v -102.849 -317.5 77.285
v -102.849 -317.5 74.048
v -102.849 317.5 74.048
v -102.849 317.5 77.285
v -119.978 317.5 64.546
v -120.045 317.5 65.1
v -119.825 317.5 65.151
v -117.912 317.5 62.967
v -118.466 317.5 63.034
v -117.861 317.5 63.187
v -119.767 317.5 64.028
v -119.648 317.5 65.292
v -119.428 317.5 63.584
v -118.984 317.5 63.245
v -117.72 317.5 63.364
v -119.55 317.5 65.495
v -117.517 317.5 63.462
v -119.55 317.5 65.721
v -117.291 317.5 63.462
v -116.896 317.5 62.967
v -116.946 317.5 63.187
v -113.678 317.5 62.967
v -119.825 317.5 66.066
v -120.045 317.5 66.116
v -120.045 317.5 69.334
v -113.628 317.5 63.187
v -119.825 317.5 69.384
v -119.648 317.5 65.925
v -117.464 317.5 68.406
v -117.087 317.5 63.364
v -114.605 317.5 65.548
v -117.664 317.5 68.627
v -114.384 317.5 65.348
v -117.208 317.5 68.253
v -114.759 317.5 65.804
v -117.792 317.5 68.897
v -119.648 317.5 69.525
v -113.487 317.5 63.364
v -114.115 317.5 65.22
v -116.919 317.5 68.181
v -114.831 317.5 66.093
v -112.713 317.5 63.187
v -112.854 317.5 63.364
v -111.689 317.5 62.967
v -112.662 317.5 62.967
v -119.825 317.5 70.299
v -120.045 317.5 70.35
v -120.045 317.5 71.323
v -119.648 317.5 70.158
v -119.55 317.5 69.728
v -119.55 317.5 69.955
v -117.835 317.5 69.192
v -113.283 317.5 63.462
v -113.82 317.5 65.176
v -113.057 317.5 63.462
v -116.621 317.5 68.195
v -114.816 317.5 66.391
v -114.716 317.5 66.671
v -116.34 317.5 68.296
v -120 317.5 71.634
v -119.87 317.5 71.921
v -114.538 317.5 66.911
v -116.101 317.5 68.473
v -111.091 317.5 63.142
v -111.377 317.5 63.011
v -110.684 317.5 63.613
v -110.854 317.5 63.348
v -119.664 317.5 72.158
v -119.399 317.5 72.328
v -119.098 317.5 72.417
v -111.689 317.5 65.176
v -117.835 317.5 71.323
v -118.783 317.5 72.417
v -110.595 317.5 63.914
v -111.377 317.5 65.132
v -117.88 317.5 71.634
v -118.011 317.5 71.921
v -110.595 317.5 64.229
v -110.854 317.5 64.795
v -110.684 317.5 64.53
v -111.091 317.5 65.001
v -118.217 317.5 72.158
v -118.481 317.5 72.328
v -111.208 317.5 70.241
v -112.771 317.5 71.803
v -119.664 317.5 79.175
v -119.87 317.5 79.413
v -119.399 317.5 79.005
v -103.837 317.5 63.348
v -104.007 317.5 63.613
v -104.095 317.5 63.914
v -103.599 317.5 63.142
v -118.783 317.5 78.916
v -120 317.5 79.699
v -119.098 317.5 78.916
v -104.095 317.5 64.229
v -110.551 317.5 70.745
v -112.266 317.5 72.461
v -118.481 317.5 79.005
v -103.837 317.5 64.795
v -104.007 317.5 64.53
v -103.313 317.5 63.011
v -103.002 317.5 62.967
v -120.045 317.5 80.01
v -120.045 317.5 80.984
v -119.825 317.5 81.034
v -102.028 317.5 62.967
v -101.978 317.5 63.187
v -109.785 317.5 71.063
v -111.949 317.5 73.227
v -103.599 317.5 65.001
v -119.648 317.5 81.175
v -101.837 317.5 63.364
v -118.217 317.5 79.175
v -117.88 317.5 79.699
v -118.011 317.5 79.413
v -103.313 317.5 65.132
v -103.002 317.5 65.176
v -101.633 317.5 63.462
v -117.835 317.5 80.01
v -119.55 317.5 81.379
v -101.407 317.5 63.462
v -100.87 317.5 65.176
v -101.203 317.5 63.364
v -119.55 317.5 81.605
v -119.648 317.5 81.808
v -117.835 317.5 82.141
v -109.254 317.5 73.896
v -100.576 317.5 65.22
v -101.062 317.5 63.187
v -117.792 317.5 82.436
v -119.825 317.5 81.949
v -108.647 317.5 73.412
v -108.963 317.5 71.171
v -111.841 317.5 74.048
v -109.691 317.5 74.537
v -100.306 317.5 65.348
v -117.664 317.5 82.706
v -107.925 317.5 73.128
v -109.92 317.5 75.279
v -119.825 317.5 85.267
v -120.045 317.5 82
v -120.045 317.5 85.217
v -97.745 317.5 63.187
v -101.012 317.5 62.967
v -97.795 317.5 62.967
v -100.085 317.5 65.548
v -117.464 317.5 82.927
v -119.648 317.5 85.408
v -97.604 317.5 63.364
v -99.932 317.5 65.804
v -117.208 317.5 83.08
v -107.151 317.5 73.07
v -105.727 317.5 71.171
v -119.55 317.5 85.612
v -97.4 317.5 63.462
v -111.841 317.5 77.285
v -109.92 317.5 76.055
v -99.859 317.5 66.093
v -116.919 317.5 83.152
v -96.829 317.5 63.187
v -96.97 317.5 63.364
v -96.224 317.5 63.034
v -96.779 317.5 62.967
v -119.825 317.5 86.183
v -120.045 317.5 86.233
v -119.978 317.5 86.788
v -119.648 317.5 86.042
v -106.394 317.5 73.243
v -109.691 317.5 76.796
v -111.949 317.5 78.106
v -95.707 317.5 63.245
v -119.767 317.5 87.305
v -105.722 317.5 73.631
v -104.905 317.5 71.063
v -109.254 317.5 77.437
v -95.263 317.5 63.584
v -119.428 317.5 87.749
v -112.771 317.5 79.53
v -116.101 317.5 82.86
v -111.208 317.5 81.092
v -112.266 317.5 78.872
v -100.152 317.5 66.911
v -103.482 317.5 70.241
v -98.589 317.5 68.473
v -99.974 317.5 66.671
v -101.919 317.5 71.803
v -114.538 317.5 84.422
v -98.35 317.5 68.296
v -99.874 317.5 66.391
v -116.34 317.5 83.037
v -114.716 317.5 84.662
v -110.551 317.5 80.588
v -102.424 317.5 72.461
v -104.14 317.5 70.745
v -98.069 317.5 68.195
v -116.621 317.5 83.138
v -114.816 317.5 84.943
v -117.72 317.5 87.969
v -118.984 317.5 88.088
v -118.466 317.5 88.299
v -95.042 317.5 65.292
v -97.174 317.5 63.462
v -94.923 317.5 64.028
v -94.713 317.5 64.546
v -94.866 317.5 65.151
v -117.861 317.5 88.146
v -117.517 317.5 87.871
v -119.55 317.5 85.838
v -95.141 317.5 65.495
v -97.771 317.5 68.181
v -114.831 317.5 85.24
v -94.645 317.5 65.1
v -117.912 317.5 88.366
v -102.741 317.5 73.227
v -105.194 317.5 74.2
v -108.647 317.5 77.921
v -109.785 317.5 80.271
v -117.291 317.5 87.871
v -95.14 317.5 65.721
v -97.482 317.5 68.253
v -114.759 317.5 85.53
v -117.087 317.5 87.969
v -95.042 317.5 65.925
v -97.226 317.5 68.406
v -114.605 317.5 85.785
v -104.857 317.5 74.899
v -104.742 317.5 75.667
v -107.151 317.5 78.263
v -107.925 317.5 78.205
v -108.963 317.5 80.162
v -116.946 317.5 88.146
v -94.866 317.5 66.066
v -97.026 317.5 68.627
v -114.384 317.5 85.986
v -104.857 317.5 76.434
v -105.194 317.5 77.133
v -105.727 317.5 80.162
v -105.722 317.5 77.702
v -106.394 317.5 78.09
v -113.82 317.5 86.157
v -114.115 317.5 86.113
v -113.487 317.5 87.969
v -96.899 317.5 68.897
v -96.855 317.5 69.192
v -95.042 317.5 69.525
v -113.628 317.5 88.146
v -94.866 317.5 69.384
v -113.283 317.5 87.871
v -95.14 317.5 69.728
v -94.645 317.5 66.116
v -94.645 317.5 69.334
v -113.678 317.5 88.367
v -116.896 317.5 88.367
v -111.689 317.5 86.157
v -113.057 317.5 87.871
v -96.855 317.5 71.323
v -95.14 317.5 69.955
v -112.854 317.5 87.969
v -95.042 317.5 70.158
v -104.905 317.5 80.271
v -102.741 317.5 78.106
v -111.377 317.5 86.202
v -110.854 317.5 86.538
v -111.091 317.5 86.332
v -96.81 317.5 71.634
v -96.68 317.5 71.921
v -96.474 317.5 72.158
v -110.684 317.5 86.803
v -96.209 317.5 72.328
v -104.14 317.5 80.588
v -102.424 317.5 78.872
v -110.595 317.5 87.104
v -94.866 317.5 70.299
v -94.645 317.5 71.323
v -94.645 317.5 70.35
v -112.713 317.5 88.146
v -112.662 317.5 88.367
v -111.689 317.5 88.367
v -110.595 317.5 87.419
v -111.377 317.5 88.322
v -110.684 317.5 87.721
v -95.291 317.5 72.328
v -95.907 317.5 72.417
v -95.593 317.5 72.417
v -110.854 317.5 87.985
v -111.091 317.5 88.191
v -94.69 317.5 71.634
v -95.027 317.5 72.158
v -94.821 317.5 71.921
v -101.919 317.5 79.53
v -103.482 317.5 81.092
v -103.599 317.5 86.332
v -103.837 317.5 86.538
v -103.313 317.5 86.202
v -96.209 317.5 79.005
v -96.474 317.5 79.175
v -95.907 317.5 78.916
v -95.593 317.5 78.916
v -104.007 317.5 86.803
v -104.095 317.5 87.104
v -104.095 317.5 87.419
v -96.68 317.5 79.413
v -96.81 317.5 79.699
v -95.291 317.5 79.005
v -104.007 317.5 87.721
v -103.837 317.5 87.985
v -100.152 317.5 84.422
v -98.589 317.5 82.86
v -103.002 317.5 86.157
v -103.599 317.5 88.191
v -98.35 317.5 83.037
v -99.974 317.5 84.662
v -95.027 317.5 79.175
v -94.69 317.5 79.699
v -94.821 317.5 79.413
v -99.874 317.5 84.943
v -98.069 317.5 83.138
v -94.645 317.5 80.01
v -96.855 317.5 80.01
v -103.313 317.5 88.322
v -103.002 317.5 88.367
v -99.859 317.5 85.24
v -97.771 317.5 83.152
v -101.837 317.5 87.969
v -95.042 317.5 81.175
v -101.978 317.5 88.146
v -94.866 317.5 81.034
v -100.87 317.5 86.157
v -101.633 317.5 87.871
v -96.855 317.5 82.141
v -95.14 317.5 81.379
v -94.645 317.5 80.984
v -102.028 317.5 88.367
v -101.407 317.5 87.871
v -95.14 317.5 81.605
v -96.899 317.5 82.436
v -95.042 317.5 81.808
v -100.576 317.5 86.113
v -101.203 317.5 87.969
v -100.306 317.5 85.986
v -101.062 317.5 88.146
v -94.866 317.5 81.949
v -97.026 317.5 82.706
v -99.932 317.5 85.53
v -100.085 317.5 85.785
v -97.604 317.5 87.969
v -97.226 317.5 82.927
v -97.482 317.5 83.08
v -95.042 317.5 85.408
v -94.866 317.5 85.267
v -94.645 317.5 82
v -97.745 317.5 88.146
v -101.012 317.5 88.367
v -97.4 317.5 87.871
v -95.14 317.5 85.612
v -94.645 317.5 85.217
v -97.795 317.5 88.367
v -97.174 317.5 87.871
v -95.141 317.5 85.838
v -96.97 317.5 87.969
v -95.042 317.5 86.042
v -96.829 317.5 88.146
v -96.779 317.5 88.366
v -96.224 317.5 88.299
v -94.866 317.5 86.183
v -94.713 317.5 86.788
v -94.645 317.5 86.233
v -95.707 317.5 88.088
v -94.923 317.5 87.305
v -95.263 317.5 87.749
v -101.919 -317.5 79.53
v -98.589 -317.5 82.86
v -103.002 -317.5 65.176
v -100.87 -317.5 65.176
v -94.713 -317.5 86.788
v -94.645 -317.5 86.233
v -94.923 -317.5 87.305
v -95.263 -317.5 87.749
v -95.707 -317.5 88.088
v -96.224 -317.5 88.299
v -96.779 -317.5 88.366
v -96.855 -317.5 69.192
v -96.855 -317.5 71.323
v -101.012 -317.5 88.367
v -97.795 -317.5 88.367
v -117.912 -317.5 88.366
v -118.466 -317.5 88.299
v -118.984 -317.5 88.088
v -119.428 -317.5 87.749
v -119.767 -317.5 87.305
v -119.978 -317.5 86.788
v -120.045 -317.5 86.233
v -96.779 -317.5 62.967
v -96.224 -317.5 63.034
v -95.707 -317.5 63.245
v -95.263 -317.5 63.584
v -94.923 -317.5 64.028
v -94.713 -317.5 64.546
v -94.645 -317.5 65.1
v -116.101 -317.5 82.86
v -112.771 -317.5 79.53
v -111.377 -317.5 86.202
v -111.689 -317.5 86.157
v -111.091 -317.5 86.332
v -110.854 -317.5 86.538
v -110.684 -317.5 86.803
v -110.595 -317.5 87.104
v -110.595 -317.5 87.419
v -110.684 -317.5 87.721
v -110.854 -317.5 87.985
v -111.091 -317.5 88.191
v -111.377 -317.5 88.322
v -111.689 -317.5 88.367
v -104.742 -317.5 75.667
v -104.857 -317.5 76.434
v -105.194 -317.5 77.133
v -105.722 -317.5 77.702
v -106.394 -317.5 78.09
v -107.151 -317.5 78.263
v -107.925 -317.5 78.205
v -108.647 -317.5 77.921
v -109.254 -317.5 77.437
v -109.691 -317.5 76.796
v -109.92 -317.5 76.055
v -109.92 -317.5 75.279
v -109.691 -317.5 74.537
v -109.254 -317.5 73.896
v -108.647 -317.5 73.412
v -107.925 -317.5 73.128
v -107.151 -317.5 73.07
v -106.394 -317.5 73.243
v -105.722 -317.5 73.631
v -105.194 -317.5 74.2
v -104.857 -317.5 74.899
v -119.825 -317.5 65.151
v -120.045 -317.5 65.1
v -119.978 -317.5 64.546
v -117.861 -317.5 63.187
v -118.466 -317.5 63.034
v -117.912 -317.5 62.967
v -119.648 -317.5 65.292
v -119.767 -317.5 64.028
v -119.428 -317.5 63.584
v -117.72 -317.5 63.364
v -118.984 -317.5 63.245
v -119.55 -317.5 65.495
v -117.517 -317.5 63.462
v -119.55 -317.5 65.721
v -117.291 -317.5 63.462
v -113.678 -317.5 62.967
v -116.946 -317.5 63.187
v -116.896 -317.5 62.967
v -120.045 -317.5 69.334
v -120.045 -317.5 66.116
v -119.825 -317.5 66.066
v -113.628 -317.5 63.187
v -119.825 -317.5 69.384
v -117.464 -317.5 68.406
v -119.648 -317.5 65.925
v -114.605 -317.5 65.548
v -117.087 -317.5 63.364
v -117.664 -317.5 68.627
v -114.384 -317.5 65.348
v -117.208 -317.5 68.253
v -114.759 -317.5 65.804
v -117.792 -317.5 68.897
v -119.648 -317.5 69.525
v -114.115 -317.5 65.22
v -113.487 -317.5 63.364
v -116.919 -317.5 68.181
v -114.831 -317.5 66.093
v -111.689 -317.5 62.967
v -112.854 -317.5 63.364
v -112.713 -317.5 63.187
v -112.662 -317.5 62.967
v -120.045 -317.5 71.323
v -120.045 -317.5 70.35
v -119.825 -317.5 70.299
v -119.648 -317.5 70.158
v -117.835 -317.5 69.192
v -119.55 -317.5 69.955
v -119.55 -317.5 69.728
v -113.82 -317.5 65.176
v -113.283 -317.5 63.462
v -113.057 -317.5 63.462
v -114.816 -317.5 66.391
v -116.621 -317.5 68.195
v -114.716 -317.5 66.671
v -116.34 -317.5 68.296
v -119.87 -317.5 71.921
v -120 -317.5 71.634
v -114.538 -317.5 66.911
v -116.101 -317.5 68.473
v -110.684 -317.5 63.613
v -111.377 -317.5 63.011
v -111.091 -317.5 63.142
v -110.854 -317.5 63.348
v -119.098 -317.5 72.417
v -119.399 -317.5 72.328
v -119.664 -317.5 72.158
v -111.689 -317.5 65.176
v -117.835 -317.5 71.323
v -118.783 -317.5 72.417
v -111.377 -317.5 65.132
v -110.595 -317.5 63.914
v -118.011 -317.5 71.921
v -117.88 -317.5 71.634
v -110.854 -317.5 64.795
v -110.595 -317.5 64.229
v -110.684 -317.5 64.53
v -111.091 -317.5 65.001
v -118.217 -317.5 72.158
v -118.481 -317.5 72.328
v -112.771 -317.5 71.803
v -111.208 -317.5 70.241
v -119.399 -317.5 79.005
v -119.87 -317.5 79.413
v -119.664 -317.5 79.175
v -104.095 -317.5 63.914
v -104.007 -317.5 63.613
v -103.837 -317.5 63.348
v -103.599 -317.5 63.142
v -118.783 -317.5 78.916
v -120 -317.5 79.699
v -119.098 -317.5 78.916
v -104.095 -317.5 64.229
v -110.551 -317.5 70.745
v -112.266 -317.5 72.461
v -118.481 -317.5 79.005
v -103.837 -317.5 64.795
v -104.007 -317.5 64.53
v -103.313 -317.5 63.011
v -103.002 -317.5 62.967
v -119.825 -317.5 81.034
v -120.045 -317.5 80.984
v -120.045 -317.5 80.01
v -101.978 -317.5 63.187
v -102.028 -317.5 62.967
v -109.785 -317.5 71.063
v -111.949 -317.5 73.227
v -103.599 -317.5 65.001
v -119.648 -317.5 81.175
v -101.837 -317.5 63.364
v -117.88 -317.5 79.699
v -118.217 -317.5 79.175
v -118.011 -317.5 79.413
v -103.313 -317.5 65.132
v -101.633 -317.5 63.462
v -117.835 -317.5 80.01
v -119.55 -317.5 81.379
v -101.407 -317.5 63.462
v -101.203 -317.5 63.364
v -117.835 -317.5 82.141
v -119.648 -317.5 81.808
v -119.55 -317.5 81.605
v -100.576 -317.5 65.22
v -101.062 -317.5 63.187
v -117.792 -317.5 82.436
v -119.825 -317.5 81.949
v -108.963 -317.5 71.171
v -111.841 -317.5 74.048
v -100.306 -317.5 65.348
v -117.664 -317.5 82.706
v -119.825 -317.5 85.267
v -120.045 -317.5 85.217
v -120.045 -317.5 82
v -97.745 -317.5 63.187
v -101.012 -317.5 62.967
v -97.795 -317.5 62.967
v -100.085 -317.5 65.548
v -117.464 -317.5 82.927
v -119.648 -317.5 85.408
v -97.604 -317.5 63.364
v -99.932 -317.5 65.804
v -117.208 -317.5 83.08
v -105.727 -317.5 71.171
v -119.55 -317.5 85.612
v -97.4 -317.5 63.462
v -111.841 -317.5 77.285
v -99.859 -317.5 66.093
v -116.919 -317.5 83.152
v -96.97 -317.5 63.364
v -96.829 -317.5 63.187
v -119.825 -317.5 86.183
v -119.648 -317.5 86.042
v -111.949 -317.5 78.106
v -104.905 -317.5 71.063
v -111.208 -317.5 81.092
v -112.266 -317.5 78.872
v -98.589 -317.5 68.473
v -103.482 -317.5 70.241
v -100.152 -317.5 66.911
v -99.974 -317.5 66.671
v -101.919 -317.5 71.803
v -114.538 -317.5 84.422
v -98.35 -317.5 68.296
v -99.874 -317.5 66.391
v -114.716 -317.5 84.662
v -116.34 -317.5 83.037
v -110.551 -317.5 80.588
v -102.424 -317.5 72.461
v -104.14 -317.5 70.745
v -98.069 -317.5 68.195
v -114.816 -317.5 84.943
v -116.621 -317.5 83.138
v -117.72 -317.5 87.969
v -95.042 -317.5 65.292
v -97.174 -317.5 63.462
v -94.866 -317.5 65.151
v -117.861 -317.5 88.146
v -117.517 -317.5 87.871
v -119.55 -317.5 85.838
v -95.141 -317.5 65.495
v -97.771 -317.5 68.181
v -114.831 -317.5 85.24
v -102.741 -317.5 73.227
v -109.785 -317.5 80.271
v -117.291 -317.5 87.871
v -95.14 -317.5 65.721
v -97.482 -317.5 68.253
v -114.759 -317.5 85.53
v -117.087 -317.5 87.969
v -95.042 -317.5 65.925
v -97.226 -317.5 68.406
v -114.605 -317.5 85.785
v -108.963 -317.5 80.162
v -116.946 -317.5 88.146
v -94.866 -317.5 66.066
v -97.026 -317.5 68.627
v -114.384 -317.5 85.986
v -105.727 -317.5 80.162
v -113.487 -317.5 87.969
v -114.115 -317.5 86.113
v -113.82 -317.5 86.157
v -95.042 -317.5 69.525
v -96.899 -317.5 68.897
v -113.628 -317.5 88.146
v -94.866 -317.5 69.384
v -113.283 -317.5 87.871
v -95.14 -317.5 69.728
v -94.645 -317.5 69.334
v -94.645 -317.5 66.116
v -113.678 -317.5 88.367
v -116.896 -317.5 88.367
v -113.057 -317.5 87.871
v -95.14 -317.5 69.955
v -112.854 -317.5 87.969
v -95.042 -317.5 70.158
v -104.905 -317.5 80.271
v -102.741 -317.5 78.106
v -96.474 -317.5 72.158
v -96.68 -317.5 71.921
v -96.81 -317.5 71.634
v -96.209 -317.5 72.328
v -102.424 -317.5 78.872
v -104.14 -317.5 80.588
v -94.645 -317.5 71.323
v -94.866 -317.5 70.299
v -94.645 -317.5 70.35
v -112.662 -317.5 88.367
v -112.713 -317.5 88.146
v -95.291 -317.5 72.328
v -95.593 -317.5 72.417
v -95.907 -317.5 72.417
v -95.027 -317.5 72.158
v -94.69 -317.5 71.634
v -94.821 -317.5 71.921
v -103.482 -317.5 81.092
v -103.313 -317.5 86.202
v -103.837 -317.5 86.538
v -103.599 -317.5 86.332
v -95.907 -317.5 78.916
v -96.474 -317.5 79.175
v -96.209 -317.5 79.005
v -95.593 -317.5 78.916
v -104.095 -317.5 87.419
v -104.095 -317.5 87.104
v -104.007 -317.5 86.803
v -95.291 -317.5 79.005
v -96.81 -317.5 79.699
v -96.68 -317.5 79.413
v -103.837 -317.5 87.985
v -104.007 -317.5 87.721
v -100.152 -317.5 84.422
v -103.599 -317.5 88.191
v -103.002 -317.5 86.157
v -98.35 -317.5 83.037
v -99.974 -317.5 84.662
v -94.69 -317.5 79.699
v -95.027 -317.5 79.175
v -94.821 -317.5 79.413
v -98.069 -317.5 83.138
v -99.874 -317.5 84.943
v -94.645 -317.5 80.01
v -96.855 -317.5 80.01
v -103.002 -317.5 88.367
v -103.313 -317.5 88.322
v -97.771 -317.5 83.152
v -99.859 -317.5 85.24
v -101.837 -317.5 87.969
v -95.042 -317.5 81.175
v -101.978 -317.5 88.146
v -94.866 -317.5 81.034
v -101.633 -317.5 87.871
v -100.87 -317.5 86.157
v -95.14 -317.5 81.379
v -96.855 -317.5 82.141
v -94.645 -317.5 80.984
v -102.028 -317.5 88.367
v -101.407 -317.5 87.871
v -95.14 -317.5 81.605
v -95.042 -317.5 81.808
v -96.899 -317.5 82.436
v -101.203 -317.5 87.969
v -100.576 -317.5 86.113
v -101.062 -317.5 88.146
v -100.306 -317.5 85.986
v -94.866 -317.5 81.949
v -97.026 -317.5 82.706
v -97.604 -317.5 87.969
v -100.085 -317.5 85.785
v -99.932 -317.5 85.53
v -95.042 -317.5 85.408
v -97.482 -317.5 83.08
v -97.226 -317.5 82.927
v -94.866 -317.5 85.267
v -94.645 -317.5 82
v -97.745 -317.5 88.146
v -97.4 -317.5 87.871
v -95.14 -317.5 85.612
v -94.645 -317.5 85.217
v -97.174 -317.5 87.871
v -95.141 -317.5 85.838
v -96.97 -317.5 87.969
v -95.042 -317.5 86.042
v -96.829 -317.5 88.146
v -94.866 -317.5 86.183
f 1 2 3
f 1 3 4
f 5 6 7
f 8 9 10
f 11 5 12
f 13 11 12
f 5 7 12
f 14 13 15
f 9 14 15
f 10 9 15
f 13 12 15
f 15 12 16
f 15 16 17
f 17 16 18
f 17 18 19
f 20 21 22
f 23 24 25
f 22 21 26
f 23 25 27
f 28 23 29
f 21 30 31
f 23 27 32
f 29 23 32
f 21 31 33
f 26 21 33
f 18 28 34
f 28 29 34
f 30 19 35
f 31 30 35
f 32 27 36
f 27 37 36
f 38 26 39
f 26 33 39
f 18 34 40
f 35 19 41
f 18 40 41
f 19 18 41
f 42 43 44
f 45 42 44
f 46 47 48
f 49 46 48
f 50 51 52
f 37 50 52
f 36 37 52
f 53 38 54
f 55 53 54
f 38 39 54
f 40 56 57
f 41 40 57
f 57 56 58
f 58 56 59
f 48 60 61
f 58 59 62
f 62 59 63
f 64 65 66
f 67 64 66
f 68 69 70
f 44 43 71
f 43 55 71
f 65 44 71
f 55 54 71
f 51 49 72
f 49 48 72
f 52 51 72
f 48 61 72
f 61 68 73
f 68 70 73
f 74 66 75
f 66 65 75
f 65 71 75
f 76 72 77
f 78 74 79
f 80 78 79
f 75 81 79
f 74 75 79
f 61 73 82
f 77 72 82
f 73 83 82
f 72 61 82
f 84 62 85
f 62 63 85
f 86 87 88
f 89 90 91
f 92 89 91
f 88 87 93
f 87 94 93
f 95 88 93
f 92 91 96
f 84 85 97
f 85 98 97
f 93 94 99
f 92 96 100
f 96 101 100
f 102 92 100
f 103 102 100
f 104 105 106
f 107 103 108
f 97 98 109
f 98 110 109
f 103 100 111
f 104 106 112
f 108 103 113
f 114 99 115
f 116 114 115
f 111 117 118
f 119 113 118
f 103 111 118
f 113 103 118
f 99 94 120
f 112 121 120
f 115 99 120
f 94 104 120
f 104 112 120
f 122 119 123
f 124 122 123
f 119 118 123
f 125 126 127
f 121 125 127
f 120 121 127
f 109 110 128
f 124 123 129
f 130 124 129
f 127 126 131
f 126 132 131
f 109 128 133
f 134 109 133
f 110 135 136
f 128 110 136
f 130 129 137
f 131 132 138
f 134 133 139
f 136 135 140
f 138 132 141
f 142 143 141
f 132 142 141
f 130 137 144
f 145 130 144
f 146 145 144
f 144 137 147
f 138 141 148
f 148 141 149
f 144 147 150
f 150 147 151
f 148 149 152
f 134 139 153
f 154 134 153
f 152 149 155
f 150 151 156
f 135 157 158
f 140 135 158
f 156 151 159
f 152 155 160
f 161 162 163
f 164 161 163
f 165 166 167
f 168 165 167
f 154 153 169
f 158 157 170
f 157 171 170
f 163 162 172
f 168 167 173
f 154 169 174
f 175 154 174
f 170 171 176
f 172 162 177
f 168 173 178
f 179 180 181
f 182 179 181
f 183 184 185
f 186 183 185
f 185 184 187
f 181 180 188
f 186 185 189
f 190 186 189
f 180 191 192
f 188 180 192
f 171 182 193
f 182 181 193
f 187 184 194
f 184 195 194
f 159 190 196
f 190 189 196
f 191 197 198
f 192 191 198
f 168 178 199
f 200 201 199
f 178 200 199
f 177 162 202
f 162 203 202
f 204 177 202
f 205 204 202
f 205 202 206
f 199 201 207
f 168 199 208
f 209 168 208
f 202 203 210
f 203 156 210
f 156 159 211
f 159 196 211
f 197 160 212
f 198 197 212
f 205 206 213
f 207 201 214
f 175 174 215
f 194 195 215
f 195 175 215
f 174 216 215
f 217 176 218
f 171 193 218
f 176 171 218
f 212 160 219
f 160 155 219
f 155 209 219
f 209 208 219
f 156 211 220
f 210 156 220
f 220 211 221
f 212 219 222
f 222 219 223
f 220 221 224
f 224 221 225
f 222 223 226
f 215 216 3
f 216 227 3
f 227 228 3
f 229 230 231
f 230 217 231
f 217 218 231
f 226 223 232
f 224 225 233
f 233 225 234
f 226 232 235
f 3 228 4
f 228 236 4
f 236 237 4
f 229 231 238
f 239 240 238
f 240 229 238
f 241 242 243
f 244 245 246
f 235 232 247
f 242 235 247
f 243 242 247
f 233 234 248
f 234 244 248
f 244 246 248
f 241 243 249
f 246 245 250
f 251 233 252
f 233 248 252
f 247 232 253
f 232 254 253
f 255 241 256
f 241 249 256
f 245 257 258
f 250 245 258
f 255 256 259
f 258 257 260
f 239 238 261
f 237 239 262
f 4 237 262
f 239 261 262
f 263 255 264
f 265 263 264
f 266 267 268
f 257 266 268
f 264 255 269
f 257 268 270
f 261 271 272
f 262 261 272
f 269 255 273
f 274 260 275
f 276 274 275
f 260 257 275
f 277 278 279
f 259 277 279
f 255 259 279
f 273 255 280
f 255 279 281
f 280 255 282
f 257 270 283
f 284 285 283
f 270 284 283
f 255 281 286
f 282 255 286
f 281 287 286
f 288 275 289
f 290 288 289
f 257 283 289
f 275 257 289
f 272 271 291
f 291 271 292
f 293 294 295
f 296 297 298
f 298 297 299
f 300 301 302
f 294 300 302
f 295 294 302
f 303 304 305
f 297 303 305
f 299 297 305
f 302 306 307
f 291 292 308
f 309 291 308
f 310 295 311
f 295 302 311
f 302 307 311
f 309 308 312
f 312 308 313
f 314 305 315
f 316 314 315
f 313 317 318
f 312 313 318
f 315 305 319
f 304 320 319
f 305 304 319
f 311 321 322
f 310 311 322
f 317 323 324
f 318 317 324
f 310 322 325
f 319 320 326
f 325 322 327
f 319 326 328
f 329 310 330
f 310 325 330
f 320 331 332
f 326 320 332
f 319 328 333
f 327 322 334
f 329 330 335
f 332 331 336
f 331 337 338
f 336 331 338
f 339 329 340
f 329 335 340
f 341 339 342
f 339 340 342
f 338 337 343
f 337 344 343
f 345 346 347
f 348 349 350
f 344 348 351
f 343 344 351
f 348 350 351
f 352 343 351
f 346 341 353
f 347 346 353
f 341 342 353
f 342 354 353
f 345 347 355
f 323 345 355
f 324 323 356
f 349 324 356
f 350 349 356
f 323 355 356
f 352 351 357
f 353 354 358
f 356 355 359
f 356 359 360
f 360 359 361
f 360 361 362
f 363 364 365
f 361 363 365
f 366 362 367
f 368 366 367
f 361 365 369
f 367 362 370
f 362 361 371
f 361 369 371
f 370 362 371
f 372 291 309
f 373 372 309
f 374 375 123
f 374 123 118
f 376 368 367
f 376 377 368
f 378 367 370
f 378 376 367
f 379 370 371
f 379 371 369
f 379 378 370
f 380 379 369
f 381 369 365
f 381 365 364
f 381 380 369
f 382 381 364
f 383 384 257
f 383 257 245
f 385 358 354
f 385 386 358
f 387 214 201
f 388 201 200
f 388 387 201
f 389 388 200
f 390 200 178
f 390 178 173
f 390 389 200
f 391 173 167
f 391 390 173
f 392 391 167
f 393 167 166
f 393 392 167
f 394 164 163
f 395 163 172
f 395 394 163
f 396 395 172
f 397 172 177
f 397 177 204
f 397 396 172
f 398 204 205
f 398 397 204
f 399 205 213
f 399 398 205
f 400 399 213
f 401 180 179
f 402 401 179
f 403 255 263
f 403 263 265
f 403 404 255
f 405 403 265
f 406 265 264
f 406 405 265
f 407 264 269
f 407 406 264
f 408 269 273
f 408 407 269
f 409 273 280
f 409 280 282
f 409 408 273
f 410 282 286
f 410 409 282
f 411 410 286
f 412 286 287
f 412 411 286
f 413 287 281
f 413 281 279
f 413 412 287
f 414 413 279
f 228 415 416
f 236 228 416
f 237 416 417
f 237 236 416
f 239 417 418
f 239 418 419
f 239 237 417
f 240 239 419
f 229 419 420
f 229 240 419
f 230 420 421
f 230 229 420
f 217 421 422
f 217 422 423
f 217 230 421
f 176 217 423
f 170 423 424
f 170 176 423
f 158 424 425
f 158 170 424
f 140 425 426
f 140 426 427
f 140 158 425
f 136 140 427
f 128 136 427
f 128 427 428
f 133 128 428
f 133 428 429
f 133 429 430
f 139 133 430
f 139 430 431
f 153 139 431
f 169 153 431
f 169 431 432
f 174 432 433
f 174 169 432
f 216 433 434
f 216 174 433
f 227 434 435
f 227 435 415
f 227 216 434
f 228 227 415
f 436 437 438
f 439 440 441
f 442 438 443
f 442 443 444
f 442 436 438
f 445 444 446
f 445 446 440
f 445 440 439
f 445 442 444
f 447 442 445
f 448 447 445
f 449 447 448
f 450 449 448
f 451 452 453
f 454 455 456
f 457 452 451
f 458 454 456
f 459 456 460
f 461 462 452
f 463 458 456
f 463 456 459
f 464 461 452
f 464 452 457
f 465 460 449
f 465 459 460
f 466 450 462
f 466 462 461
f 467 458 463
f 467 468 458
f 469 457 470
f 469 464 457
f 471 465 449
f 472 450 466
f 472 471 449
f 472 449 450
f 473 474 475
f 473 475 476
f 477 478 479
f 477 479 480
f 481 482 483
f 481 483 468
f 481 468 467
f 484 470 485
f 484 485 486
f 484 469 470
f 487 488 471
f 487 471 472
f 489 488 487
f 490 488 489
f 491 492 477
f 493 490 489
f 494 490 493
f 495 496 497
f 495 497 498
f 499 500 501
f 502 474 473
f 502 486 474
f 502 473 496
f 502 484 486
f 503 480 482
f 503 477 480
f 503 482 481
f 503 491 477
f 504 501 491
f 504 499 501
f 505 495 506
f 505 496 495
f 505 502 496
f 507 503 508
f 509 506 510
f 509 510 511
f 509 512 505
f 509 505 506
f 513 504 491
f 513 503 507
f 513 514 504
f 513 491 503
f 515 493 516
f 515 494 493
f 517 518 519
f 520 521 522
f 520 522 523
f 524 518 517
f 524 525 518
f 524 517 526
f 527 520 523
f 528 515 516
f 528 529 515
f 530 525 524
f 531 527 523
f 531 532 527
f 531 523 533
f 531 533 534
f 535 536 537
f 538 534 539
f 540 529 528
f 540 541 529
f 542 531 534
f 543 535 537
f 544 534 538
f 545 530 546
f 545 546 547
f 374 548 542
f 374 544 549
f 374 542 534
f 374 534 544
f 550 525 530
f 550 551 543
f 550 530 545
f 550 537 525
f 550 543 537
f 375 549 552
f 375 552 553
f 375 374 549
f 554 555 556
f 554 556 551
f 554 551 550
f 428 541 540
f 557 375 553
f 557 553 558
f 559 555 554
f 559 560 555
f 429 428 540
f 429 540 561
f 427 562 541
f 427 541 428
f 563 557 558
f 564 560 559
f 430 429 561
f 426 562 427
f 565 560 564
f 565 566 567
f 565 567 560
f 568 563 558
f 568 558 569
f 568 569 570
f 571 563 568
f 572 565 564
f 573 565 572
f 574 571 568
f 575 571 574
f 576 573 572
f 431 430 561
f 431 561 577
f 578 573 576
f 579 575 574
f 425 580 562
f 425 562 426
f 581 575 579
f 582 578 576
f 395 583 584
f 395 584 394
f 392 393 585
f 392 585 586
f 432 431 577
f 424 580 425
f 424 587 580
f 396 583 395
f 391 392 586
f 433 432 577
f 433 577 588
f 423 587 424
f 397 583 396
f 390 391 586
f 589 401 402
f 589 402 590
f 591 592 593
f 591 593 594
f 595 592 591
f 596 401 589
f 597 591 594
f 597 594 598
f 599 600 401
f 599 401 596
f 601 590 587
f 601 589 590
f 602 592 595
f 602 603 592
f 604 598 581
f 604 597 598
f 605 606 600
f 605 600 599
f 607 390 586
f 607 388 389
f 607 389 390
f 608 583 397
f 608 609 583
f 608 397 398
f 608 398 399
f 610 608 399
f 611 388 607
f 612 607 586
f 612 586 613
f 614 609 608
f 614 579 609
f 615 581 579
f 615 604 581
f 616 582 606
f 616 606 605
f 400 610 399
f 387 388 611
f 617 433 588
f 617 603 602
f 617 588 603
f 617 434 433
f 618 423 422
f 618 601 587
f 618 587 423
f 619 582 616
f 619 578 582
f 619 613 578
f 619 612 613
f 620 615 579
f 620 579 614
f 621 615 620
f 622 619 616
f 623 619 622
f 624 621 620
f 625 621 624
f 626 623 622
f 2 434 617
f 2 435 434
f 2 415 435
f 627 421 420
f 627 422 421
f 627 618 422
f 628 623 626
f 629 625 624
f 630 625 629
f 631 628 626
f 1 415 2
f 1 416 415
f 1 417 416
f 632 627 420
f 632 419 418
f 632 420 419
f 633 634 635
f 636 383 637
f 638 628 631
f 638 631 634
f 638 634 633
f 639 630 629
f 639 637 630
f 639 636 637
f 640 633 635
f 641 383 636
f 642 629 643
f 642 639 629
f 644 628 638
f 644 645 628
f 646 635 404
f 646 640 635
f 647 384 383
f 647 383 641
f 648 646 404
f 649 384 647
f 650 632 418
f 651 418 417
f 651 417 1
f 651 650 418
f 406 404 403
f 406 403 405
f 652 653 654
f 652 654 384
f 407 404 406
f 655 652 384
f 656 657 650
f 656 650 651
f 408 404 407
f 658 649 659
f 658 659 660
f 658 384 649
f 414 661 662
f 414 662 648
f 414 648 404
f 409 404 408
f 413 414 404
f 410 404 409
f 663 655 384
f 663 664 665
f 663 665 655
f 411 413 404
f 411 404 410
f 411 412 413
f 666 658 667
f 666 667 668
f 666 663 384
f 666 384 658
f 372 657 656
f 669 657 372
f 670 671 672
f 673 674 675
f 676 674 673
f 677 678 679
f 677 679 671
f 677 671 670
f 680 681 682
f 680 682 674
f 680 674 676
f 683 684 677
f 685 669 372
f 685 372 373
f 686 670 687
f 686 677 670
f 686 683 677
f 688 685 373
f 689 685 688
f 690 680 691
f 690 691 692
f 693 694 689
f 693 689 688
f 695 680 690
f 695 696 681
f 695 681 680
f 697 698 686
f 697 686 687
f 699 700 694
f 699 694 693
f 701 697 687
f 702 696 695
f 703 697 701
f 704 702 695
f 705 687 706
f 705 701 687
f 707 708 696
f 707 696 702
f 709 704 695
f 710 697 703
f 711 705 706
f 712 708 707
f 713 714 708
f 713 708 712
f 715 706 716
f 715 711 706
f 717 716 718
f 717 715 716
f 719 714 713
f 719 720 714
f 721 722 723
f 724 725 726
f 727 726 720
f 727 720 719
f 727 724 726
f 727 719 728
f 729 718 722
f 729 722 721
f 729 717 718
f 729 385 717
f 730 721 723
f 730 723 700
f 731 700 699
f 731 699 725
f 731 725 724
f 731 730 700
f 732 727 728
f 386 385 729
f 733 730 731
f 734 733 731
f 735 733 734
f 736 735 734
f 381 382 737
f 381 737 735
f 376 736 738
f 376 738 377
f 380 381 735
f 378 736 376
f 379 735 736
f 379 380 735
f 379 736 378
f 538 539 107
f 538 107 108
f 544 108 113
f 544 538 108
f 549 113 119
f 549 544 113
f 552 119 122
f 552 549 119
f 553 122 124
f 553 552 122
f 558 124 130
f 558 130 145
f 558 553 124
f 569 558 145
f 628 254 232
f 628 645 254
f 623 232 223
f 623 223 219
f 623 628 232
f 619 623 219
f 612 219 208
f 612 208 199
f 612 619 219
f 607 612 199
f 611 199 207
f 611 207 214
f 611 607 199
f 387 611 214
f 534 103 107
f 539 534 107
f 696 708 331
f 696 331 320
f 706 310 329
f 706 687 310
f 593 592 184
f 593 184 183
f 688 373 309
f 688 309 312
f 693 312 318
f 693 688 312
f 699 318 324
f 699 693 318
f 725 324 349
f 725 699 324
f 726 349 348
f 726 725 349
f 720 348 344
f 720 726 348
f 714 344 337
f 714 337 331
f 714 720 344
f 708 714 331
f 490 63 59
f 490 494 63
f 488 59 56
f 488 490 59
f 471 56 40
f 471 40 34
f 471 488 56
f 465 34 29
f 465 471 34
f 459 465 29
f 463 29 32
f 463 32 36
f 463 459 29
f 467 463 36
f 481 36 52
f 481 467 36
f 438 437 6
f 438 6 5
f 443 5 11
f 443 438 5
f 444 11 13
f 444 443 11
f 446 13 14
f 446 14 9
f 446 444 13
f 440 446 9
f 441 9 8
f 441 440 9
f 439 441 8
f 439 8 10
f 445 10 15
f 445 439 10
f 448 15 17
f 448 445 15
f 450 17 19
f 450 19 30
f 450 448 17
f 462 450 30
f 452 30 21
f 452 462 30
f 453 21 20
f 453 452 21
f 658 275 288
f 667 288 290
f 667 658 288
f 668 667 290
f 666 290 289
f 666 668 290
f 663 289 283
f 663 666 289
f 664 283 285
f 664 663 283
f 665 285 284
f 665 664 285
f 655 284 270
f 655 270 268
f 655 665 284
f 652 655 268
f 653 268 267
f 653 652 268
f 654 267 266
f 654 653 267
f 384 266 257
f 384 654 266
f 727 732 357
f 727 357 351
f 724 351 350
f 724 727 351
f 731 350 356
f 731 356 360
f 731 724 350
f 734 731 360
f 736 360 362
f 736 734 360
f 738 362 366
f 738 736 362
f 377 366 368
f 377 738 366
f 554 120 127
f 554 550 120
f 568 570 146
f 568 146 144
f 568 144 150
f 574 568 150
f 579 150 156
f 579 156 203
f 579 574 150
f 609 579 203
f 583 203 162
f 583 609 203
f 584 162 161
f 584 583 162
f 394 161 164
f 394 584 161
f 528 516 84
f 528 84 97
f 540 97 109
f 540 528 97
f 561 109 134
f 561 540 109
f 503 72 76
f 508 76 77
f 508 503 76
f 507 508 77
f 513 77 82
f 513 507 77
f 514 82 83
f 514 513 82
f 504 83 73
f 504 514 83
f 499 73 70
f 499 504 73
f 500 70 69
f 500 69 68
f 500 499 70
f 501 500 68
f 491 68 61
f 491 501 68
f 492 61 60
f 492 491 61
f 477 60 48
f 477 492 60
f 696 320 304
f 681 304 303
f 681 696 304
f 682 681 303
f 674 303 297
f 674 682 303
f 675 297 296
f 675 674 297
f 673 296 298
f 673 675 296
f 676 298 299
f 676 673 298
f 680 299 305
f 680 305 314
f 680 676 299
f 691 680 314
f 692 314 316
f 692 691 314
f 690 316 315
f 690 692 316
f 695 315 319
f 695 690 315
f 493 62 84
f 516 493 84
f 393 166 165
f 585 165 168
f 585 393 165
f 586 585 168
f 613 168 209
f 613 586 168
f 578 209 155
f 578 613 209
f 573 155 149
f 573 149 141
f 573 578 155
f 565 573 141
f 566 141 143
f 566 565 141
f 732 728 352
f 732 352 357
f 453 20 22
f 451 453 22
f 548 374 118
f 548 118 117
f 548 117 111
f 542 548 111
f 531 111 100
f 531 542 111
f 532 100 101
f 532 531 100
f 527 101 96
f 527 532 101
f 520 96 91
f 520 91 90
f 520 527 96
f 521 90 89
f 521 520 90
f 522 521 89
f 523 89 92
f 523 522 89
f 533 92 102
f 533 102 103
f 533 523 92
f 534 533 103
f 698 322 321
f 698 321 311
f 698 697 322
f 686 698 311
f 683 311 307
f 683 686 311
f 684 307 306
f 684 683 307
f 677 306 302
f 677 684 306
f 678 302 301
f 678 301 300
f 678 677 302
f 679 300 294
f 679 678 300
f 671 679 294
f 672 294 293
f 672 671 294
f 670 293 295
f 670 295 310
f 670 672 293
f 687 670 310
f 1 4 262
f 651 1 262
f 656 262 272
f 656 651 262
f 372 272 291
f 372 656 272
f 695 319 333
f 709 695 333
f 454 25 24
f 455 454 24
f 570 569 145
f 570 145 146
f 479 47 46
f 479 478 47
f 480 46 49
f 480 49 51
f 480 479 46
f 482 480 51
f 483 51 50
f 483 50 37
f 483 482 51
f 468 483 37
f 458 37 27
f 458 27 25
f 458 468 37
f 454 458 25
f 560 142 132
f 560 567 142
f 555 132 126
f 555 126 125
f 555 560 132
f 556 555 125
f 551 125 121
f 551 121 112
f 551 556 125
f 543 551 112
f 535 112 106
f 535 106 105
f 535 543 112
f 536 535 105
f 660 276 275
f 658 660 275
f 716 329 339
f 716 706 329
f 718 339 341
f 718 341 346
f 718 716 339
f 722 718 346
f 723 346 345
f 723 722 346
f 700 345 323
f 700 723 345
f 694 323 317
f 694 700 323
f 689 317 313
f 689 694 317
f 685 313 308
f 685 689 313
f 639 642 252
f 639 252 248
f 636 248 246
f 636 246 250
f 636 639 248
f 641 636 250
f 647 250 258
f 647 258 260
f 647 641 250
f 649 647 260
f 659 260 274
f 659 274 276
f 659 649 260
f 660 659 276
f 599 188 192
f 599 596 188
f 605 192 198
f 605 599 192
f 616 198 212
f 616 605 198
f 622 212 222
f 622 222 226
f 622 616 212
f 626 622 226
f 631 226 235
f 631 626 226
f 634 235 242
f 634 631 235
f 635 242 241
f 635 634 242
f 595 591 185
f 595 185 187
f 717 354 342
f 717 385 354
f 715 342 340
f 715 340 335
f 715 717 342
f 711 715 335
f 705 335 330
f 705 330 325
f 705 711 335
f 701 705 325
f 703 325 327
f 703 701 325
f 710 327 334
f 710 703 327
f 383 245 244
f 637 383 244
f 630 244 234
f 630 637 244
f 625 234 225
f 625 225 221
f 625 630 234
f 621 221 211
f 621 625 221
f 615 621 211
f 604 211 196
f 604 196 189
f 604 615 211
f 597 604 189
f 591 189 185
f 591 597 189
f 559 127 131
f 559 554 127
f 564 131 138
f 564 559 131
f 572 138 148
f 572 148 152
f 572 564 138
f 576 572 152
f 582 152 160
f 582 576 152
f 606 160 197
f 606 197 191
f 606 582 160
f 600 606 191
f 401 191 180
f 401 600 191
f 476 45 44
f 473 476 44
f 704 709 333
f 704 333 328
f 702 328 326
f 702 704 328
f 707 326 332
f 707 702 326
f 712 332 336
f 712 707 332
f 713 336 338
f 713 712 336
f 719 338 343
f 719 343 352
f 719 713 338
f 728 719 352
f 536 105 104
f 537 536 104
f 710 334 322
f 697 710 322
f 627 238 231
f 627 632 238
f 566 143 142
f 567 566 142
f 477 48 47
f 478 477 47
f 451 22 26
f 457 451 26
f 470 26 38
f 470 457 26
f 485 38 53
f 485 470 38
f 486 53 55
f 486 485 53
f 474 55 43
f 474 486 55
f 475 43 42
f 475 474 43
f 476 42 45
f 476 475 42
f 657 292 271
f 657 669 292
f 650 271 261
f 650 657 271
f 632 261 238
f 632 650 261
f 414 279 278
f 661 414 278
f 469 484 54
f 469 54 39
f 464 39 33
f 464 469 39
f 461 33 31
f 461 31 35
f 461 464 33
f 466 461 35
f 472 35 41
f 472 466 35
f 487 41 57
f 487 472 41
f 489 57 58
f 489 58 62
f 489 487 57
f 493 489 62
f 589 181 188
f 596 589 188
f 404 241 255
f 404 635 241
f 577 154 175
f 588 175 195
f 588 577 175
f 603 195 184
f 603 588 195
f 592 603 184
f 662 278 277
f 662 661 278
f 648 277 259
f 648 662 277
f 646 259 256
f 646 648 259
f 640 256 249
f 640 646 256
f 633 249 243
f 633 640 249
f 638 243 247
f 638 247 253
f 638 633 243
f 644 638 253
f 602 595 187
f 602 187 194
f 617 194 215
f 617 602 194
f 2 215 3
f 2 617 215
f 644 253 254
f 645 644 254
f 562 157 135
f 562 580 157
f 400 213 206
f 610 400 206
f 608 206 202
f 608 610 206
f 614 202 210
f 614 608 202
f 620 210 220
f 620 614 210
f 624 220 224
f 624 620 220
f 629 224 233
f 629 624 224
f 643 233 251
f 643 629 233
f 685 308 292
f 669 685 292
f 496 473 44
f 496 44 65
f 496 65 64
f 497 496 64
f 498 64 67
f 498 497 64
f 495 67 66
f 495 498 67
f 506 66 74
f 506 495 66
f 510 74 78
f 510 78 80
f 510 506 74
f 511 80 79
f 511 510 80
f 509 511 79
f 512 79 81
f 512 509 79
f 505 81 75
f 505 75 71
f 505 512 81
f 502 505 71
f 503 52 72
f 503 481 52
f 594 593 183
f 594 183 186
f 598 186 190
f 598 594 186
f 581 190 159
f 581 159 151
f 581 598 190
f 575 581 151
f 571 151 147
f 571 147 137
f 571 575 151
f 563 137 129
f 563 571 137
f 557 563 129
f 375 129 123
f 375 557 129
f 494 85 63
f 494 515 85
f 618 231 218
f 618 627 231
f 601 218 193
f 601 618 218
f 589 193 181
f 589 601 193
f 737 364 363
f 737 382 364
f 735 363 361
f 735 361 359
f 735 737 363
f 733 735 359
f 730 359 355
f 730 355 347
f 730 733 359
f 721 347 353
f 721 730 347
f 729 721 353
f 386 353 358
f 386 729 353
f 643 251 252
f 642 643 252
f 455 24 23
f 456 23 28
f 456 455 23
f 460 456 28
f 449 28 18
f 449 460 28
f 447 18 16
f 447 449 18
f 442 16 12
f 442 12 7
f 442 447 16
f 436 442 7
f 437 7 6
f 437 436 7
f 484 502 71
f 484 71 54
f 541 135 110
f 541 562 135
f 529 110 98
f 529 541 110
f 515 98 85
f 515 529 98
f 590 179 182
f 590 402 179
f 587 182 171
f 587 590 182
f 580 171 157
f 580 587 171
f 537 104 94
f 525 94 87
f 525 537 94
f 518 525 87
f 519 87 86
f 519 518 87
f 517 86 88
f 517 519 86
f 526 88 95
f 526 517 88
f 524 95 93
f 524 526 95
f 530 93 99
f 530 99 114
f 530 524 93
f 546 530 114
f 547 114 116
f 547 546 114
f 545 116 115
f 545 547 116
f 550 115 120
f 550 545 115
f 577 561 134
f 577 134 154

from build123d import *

# Parameters (mm, degrees)
F0_R     = 2.6035
F1_DEPTH = 317.5


# Not quite as in the source:
# - ends of sketch curves that miss each other by under 0.0002 mm in the source are joined


with BuildPart() as f1:
    # F0 (on Front) → F1 (new body, symmetric)
    with BuildSketch(Plane.XZ):
        with BuildLine():
            ThreePointArc((-120.045226, 66.1162), (-119.5372260057, 65.6082762), (-120.0450736, 65.1002000229))
            ThreePointArc((-120.0450736, 65.1002000229), (-119.4277485161, 63.5840774839), (-117.9116260074, 62.9667530175))
            ThreePointArc((-117.9116260074, 62.9667530175), (-117.4035498, 63.4745999943), (-116.895626, 62.9666))
            Line((-116.895626, 62.9666), (-113.6783096, 62.9666))
            ThreePointArc((-113.6783096, 62.9666), (-113.1703096, 63.4746), (-112.6623096, 62.9666))
            Line((-112.6623096, 62.9666), (-111.688626, 62.9666))
            ThreePointArc((-111.688626, 62.9666), (-110.583726, 64.0715), (-111.688626, 65.1764))
            Line((-111.688626, 65.1764), (-113.8200162, 65.1764))
            ThreePointArc((-113.8200162, 65.1764), (-114.758677805, 65.8035936327), (-114.5384366897, 66.9108204897))
            Line((-114.5384366897, 66.9108204897), (-111.2083882, 70.2408552))
            ThreePointArc((-111.2083882, 70.2408552), (-110.1783528978, 70.9291175157), (-108.963333, 71.1708))
            Line((-108.963333, 71.1708), (-105.727119, 71.1708))
            ThreePointArc((-105.727119, 71.1708), (-104.5120991022, 70.9291175157), (-103.4820549697, 70.2408640303))
            Line((-103.4820549697, 70.2408640303), (-100.1520222, 66.9108136))
            ThreePointArc((-100.1520222, 66.9108136), (-99.931774195, 65.8035936327), (-100.8704358, 65.1764))
            Line((-100.8704358, 65.1764), (-103.001826, 65.1764))
            ThreePointArc((-103.001826, 65.1764), (-104.106726, 64.0715), (-103.001826, 62.9666))
            Line((-103.001826, 62.9666), (-102.0281424, 62.9666))
            ThreePointArc((-102.0281424, 62.9666), (-101.5201424, 63.4746), (-101.0121424, 62.9666))
            Line((-101.0121424, 62.9666), (-97.794826, 62.9666))
            ThreePointArc((-97.794826, 62.9666), (-97.2869022, 63.4745999943), (-96.7788260229, 62.9667524))
            ThreePointArc((-96.7788260229, 62.9667524), (-95.2627034839, 63.5840774839), (-94.6453790175, 65.1001999926))
            ThreePointArc((-94.6453790175, 65.1001999926), (-95.1532259943, 65.6082762), (-94.645226, 66.1162))
            Line((-94.645226, 66.1162), (-94.645226, 69.3335164))
            ThreePointArc((-94.645226, 69.3335164), (-95.153226, 69.8415164), (-94.645226, 70.3495164))
            Line((-94.645226, 70.3495164), (-94.645226, 71.3232))
            ThreePointArc((-94.645226, 71.3232), (-95.750126, 72.4281), (-96.855026, 71.3232))
            Line((-96.855026, 71.3232), (-96.855026, 69.1918098))
            ThreePointArc((-96.855026, 69.1918098), (-97.4822196327, 68.253148195), (-98.5894464897, 68.4733893103))
            Line((-98.5894464897, 68.4733893103), (-101.9194812, 71.8034378))
            ThreePointArc((-101.9194812, 71.8034378), (-102.6077435157, 72.8334731022), (-102.849426, 74.048493))
            Line((-102.849426, 74.048493), (-102.849426, 77.284707))
            ThreePointArc((-102.849426, 77.284707), (-102.6077435157, 78.4997268978), (-101.9194900303, 79.5297710303))
            Line((-101.9194900303, 79.5297710303), (-98.5894396, 82.8598038))
            ThreePointArc((-98.5894396, 82.8598038), (-97.4822196327, 83.080051805), (-96.855026, 82.1413902))
            Line((-96.855026, 82.1413902), (-96.855026, 80.01))
            ThreePointArc((-96.855026, 80.01), (-95.750126, 78.9051), (-94.645226, 80.01))
            Line((-94.645226, 80.01), (-94.645226, 80.9836836))
            ThreePointArc((-94.645226, 80.9836836), (-95.153226, 81.4916836), (-94.645226, 81.9996836))
            Line((-94.645226, 81.9996836), (-94.645226, 85.217))
            ThreePointArc((-94.645226, 85.217), (-95.1532259943, 85.7249238), (-94.6453784, 86.2329999771))
            ThreePointArc((-94.6453784, 86.2329999771), (-95.2627034839, 87.7491225161), (-96.7788259926, 88.3664469825))
            ThreePointArc((-96.7788259926, 88.3664469825), (-97.2869022, 87.8586000057), (-97.794826, 88.3666))
            Line((-97.794826, 88.3666), (-101.0121424, 88.3666))
            ThreePointArc((-101.0121424, 88.3666), (-101.5201424, 87.8586), (-102.0281424, 88.3666))
            Line((-102.0281424, 88.3666), (-103.001826, 88.3666))
            ThreePointArc((-103.001826, 88.3666), (-104.106726, 87.2617), (-103.001826, 86.1568))
            Line((-103.001826, 86.1568), (-100.8704358, 86.1568))
            ThreePointArc((-100.8704358, 86.1568), (-99.931774195, 85.5296063673), (-100.1520153103, 84.4223795103))
            Line((-100.1520153103, 84.4223795103), (-103.4820638, 81.0923448))
            ThreePointArc((-103.4820638, 81.0923448), (-104.5120991022, 80.4040824843), (-105.727119, 80.1624))
            Line((-105.727119, 80.1624), (-108.963333, 80.1624))
            ThreePointArc((-108.963333, 80.1624), (-110.1783528978, 80.4040824843), (-111.2083970303, 81.0923359697))
            Line((-111.2083970303, 81.0923359697), (-114.5384298, 84.4223864))
            ThreePointArc((-114.5384298, 84.4223864), (-114.758677805, 85.5296063673), (-113.8200162, 86.1568))
            Line((-113.8200162, 86.1568), (-111.688626, 86.1568))
            ThreePointArc((-111.688626, 86.1568), (-110.583726, 87.2617), (-111.688626, 88.3666))
            Line((-111.688626, 88.3666), (-112.6623096, 88.3666))
            ThreePointArc((-112.6623096, 88.3666), (-113.1703096, 87.8586), (-113.6783096, 88.3666))
            Line((-113.6783096, 88.3666), (-116.895626, 88.3666))
            ThreePointArc((-116.895626, 88.3666), (-117.4035498, 87.8586000057), (-117.9116259771, 88.3664476))
            ThreePointArc((-117.9116259771, 88.3664476), (-119.4277485161, 87.7491225161), (-120.0450729825, 86.2330000074))
            ThreePointArc((-120.0450729825, 86.2330000074), (-119.5372260057, 85.7249238), (-120.045226, 85.217))
            Line((-120.045226, 85.217), (-120.045226, 81.9996836))
            ThreePointArc((-120.045226, 81.9996836), (-119.537226, 81.4916836), (-120.045226, 80.9836836))
            Line((-120.045226, 80.9836836), (-120.045226, 80.01))
            ThreePointArc((-120.045226, 80.01), (-118.940326, 78.9051), (-117.835426, 80.01))
            Line((-117.835426, 80.01), (-117.835426, 82.1413902))
            ThreePointArc((-117.835426, 82.1413902), (-117.2082323673, 83.080051805), (-116.1010055103, 82.8598106897))
            Line((-116.1010055103, 82.8598106897), (-112.7709708, 79.5297622))
            ThreePointArc((-112.7709708, 79.5297622), (-112.0827084843, 78.4997268978), (-111.841026, 77.284707))
            Line((-111.841026, 77.284707), (-111.841026, 74.048493))
            ThreePointArc((-111.841026, 74.048493), (-112.0827084843, 72.8334731022), (-112.7709619697, 71.8034289697))
            Line((-112.7709619697, 71.8034289697), (-116.1010124, 68.4733962))
            ThreePointArc((-116.1010124, 68.4733962), (-117.2082323673, 68.253148195), (-117.835426, 69.1918098))
            Line((-117.835426, 69.1918098), (-117.835426, 71.3232))
            ThreePointArc((-117.835426, 71.3232), (-118.940326, 72.4281), (-120.045226, 71.3232))
            Line((-120.045226, 71.3232), (-120.045226, 70.3495164))
            ThreePointArc((-120.045226, 70.3495164), (-119.537226, 69.8415164), (-120.045226, 69.3335164))
            Line((-120.045226, 69.3335164), (-120.045226, 66.1162))
        make_face()
        with Locations((-107.345226, 75.6666)):
            Circle(F0_R, mode=Mode.SUBTRACT)
    extrude(amount=F1_DEPTH, both=True)


solid = f1.part
